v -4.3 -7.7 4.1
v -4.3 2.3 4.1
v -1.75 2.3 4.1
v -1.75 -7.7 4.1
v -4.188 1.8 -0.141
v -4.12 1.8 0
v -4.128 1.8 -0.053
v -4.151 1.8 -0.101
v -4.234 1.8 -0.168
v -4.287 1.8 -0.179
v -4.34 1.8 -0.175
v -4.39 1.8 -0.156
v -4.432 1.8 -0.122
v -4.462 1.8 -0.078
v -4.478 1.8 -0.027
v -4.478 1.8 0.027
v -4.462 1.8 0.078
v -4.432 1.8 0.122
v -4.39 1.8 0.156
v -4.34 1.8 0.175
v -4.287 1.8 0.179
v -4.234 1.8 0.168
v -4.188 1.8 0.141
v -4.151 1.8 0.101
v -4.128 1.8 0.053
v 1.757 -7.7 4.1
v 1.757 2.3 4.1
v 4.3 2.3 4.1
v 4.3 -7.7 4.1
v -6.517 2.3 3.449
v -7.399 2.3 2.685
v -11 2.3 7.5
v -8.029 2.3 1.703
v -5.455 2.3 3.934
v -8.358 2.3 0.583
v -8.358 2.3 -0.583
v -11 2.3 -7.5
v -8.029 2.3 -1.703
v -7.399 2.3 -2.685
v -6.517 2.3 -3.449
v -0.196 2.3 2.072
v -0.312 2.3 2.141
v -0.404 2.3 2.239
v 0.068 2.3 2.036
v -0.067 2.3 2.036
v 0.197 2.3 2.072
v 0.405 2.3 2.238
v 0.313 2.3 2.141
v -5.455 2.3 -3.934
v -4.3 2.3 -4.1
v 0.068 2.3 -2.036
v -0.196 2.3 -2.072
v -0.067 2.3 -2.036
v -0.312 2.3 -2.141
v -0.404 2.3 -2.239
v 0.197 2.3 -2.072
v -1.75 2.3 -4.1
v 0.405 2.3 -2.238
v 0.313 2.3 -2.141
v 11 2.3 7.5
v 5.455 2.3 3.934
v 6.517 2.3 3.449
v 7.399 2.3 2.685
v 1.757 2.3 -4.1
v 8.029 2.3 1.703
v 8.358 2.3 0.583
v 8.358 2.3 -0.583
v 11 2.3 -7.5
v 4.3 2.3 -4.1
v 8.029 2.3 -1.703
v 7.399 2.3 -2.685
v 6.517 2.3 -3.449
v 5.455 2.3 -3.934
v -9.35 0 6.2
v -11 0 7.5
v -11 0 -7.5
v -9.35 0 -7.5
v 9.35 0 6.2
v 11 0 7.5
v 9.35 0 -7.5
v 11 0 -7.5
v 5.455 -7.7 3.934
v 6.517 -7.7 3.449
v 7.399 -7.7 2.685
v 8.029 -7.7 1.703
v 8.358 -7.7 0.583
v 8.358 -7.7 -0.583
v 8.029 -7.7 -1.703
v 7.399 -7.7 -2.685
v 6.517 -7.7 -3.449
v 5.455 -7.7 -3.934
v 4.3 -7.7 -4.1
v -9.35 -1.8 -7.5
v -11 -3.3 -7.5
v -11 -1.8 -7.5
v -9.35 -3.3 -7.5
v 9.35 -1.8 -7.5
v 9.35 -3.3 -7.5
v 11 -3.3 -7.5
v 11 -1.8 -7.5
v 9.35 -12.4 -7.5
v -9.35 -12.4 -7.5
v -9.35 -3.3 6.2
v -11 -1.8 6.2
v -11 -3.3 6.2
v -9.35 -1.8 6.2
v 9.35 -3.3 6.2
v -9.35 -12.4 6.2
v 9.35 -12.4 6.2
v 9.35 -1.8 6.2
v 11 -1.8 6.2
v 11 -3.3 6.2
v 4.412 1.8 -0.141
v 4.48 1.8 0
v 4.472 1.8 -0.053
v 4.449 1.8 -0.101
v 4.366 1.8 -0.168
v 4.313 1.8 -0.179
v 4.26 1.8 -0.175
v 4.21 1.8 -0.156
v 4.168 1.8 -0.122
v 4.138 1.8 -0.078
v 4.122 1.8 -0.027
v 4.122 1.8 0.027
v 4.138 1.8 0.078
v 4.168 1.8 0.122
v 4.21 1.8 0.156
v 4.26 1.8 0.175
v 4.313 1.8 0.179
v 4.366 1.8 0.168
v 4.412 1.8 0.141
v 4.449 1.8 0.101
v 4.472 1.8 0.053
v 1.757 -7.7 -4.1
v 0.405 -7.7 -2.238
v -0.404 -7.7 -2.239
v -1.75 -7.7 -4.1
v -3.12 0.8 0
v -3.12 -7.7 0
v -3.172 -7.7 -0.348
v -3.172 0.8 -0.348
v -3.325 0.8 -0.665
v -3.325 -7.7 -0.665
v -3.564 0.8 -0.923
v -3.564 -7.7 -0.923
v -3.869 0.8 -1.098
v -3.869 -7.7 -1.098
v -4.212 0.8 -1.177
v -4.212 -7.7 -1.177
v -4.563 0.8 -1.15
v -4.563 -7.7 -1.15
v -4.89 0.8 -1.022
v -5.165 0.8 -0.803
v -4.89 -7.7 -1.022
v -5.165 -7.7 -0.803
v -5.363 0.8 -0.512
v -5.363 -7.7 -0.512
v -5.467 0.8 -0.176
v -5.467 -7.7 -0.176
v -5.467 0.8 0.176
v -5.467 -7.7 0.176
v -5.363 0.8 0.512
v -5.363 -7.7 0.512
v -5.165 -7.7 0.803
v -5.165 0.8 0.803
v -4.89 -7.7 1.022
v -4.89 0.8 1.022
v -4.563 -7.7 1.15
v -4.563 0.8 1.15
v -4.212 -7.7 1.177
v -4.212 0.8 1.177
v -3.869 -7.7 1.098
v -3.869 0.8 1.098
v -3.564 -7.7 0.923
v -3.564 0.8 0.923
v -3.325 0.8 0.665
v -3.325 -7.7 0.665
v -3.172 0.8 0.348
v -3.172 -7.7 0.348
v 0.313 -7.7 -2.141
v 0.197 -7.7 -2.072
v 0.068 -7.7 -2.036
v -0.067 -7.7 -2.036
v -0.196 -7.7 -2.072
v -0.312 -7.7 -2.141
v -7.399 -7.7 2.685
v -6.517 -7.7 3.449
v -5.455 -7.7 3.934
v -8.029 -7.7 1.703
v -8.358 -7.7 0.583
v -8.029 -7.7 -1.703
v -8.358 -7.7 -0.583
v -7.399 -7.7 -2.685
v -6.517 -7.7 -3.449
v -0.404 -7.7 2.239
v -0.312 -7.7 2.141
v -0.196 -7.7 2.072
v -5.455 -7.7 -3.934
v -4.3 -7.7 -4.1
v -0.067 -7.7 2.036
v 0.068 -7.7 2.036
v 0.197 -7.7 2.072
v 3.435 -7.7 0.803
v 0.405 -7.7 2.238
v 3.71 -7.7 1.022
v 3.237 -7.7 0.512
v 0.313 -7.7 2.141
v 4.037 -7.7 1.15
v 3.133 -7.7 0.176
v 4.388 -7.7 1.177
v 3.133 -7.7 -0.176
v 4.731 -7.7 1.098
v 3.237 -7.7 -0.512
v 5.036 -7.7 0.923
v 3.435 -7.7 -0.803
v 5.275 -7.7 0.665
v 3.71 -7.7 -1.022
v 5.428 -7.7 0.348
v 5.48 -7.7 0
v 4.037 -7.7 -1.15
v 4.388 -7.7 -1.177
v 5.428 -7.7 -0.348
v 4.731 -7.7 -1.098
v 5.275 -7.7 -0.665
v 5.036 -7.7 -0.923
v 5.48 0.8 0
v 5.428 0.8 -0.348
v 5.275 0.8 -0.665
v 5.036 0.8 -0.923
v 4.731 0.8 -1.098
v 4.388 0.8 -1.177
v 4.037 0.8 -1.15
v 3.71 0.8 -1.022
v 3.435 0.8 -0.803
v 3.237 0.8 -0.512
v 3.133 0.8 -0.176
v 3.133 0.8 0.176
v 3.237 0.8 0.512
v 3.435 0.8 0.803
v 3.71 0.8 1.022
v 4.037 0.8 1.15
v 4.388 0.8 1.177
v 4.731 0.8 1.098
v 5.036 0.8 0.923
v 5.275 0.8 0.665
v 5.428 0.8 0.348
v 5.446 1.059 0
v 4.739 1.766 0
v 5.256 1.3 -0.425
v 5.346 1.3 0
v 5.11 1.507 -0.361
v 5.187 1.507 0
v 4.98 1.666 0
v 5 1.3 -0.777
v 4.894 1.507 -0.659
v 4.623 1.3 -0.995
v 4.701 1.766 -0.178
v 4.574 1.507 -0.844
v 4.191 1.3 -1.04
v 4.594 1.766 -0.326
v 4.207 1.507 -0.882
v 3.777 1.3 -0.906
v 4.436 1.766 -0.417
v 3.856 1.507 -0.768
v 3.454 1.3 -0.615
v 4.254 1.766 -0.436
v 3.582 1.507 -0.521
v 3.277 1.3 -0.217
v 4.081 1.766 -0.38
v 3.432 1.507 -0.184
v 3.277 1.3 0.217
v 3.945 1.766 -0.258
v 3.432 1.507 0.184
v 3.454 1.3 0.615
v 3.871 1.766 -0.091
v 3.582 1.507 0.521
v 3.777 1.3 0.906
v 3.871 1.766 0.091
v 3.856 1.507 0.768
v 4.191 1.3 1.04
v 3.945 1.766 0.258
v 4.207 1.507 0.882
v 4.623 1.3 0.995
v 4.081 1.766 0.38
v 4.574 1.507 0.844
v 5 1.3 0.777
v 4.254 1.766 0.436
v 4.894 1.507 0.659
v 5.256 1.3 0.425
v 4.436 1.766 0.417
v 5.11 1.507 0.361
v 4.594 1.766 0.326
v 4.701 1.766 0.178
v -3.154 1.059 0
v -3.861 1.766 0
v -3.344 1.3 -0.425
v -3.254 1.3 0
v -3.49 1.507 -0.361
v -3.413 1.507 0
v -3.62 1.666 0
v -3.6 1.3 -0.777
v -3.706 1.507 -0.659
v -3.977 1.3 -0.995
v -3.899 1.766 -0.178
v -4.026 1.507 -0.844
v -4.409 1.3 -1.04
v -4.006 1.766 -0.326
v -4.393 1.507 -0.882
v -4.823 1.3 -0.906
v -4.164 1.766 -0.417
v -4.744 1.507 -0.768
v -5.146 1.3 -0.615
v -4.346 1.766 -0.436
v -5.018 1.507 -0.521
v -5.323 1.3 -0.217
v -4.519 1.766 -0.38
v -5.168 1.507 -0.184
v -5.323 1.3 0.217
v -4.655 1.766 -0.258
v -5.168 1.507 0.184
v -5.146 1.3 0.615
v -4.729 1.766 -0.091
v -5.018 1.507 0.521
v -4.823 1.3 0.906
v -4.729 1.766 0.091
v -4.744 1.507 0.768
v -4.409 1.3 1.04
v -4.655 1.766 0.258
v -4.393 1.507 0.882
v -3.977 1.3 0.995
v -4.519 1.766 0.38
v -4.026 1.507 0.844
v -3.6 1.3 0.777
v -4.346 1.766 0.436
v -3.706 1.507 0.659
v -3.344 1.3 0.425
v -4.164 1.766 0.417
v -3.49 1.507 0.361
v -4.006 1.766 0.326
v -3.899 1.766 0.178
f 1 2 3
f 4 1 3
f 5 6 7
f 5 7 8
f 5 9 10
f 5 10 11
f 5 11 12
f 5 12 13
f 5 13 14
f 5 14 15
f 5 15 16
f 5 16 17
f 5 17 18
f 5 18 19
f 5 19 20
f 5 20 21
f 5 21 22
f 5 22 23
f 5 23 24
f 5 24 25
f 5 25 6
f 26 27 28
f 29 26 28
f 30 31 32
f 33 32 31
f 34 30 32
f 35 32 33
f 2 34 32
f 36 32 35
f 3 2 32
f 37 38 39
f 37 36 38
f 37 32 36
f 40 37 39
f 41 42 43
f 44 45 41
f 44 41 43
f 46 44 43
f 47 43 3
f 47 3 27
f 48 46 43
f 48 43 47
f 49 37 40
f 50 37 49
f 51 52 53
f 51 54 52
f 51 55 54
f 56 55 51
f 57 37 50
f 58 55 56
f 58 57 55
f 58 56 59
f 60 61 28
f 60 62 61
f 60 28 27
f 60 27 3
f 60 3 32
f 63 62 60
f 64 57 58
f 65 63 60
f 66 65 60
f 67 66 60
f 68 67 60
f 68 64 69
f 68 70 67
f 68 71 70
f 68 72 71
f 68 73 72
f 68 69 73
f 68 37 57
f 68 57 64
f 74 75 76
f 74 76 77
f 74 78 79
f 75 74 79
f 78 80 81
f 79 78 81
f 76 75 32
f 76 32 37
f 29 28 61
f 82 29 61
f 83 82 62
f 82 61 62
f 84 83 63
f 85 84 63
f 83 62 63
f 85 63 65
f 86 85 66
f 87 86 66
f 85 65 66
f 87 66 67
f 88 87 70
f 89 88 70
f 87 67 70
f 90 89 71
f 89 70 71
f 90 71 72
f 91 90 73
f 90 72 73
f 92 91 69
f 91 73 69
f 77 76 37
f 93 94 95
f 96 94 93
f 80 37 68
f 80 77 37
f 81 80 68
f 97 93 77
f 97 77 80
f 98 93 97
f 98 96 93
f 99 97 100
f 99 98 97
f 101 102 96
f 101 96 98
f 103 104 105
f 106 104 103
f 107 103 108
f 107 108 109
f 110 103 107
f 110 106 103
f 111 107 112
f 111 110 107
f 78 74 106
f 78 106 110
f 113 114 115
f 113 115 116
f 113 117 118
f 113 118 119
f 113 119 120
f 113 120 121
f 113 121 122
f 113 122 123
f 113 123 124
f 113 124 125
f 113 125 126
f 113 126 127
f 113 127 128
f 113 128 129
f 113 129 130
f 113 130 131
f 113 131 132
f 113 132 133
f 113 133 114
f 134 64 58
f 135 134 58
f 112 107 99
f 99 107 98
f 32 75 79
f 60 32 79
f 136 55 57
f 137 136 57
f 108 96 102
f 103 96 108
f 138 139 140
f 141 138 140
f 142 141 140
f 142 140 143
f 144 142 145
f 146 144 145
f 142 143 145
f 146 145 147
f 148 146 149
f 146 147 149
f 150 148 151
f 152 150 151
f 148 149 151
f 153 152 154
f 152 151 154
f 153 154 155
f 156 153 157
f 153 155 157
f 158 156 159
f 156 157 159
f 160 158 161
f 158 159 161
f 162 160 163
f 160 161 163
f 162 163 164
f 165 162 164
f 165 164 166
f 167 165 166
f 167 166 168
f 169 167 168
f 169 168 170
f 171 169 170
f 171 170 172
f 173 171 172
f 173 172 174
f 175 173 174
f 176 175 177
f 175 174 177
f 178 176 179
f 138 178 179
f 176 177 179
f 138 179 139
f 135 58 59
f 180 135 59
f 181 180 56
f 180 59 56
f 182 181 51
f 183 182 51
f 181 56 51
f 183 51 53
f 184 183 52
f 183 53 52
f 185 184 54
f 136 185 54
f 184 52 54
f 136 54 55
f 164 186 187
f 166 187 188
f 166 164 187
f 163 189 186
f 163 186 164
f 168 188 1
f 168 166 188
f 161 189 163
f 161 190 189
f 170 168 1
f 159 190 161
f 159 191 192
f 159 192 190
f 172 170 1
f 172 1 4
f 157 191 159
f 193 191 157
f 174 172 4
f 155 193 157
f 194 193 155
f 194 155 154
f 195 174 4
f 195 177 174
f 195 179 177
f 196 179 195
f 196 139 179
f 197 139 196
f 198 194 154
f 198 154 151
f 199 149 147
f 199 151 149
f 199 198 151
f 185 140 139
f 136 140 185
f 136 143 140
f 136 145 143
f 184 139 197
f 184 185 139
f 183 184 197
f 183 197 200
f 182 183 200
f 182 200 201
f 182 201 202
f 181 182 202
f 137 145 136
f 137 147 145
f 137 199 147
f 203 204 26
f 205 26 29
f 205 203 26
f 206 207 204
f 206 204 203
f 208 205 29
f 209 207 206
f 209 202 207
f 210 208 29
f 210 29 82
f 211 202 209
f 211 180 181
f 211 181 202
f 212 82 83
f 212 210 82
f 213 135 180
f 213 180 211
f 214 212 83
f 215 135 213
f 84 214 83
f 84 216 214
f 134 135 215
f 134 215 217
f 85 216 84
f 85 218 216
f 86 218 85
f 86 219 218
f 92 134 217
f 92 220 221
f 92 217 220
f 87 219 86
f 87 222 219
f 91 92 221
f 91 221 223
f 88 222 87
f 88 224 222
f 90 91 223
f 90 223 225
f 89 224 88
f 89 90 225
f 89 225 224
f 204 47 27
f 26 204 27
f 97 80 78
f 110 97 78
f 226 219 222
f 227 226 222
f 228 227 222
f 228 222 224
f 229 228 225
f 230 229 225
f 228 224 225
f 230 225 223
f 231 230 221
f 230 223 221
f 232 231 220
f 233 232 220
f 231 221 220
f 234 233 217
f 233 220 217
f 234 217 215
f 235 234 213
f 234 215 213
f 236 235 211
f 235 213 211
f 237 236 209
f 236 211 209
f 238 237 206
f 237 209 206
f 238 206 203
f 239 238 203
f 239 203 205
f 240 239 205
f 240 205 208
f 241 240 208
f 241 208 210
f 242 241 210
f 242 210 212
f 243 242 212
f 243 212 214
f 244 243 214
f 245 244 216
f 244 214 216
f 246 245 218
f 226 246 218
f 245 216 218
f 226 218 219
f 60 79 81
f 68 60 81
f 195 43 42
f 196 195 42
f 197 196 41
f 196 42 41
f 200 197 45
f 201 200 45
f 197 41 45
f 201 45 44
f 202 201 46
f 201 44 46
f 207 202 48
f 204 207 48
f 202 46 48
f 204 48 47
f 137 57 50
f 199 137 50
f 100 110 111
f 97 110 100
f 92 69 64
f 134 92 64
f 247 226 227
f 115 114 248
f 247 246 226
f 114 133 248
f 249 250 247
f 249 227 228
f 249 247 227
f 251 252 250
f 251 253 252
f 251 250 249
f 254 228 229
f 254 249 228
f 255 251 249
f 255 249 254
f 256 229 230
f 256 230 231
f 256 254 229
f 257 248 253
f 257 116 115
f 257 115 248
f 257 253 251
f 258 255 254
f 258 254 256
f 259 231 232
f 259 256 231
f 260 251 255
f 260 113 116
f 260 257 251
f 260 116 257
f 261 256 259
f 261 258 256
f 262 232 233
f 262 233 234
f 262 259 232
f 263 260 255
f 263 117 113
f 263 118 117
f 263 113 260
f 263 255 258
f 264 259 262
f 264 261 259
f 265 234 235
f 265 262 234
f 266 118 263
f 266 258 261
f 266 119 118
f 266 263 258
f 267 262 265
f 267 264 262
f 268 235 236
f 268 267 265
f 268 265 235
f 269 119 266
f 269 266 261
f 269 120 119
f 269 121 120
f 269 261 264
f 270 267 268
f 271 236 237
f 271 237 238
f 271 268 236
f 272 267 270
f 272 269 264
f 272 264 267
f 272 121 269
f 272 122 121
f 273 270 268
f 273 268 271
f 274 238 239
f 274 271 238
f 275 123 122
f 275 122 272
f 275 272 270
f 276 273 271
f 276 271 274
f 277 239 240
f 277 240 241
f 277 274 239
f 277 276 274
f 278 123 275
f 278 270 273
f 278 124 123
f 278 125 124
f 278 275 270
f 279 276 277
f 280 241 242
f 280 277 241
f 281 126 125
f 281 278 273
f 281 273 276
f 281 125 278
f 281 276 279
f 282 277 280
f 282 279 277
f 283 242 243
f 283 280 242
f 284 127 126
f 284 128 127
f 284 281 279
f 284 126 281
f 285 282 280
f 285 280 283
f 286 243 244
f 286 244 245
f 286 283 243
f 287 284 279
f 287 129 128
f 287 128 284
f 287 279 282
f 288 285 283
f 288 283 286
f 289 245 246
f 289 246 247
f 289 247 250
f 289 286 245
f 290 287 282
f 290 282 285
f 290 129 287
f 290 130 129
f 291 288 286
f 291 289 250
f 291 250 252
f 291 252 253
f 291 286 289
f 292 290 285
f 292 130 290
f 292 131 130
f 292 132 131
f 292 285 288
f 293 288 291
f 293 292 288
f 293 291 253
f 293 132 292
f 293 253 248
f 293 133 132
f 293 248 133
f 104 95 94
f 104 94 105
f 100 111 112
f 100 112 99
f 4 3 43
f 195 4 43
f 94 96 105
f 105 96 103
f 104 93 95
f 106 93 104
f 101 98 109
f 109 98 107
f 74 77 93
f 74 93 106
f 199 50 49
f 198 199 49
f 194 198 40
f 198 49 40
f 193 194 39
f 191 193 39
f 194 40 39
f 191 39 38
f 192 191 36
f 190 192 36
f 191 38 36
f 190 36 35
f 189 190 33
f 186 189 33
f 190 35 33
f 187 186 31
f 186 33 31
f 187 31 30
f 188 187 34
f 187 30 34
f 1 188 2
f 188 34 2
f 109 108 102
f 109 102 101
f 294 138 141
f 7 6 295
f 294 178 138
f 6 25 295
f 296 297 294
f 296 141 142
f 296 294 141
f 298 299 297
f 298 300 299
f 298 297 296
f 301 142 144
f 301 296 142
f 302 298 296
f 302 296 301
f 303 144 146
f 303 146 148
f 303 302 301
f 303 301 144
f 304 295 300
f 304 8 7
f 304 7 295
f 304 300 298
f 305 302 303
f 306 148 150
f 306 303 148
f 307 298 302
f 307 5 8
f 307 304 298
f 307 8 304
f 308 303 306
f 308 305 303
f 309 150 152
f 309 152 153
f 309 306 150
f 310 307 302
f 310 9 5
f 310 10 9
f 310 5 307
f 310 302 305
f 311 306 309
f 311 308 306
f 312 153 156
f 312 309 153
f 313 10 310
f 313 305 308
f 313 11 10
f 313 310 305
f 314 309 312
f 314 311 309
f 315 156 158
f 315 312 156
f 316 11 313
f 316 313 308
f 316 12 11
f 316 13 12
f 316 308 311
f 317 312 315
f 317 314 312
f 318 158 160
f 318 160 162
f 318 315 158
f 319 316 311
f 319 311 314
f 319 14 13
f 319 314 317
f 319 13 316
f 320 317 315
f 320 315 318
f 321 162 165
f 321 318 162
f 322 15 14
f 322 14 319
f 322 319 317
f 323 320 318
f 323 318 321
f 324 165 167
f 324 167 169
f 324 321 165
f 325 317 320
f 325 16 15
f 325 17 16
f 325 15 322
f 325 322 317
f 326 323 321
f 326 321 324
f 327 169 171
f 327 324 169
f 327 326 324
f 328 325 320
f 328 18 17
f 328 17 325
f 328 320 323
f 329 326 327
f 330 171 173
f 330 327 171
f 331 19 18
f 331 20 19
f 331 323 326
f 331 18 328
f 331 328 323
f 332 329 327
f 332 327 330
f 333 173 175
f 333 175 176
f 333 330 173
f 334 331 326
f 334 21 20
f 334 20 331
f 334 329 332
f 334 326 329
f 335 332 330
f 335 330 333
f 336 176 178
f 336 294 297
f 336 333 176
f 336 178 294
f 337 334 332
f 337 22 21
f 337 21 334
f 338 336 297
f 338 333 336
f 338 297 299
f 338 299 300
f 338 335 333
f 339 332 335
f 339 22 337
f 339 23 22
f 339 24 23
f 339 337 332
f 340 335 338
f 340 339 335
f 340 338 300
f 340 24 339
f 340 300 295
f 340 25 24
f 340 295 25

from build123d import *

# Parameters (mm, degrees)
SKETCH_1_W          = 22
SKETCH_1_H          = 15
EXTRUDE_1_DEPTH     = 2.3
SKETCH_2_W          = 18.7
SKETCH_2_H          = 13.7
EXTRUDE_2_DEPTH     = 12.4
SKETCH_3_W          = 13.7
SKETCH_3_H          = 1.5
EXTRUDE_3_DEPTH     = 1.65
SKETCH_4_W          = 13.7
SKETCH_4_H          = 1.5
EXTRUDE_4_DEPTH     = 1.65
CUT_EXTRUDE_1_DEPTH = 10
SKETCH_5_R          = 1.18
EXTRUDE_5_DEPTH     = 9.5
FILLET_6_R          = 1


with BuildPart() as part:
    # 草图1 → 凸台-拉伸1 (new body)
    with BuildSketch(Plane(origin=(0, 0, 0), x_dir=(1, 0, 0), z_dir=(0, 1, 0))):
        Rectangle(SKETCH_1_W, SKETCH_1_H)
    extrude(amount=EXTRUDE_1_DEPTH)

    # 草图2 → 凸台-拉伸2 (add)
    with BuildSketch(Plane.XZ):
        with Locations((0, -0.65)):
            Rectangle(SKETCH_2_W, SKETCH_2_H)
    extrude(amount=EXTRUDE_2_DEPTH)

    # 草图3 → 凸台-拉伸3 (add)
    with BuildSketch(Plane.ZY.offset(9.35)):
        with Locations((-0.65, -2.55)):
            Rectangle(SKETCH_3_W, SKETCH_3_H)
    extrude(amount=EXTRUDE_3_DEPTH)

    # 草图4 → 凸台-拉伸4 (add)
    with BuildSketch(Plane(origin=(9.35, 0, 0), x_dir=(0, 0, -1), z_dir=(1, 0, 0))):
        with Locations((0.65, -2.55)):
            Rectangle(SKETCH_4_W, SKETCH_4_H)
    extrude(amount=EXTRUDE_4_DEPTH)

    # 草图6 → 切除-拉伸1 (cut)
    with BuildSketch(Plane(origin=(0, 2.3, 0), x_dir=(1, 0, 0), z_dir=(0, 1, 0))):
        with BuildLine():
            Line((0.405473154, -2.237773908), (1.757477388, -4.1))
            Line((1.757477388, -4.1), (4.3, -4.1))
            ThreePointArc((4.3, -4.1), (8.4, 0), (4.3, 4.1))
            Line((4.3, 4.1), (1.757477388, 4.1))
            Line((1.757477388, 4.1), (0.405473154, 2.237773908))
            ThreePointArc((0.405473154, 2.237773908), (0.000356772, 2.031527095), (-0.404340983, 2.238594131))
            Line((-0.404340983, 2.238594131), (-1.75, 4.1))
            Line((-1.75, 4.1), (-4.3, 4.1))
            ThreePointArc((-4.3, 4.1), (-8.4, 0), (-4.3, -4.1))
            Line((-4.3, -4.1), (-1.75, -4.1))
            Line((-1.75, -4.1), (-0.404340983, -2.238594131))
            ThreePointArc((-0.404340983, -2.238594131), (0.000356772, -2.031527095), (0.405473154, -2.237773908))
        make_face()
    extrude(amount=-CUT_EXTRUDE_1_DEPTH, mode=Mode.SUBTRACT)

    # 草图5 → 凸台-拉伸5 (add)
    with BuildSketch(Plane(origin=(0, -7.7, 0), x_dir=(1, 0, 0), z_dir=(0, 1, 0))):
        with Locations((-4.3, 0)):
            Circle(SKETCH_5_R)
        with Locations((4.3, 0)):
            Circle(SKETCH_5_R)
    extrude(amount=EXTRUDE_5_DEPTH)

    # 圆角6
    fillet_6_edges = [part.edges().sort_by_distance(p)[0] for p in [
        (-5.48, 1.8, 0),
        (3.12, 1.8, 0),
    ]]
    fillet(fillet_6_edges, radius=FILLET_6_R)


solid = part.part
